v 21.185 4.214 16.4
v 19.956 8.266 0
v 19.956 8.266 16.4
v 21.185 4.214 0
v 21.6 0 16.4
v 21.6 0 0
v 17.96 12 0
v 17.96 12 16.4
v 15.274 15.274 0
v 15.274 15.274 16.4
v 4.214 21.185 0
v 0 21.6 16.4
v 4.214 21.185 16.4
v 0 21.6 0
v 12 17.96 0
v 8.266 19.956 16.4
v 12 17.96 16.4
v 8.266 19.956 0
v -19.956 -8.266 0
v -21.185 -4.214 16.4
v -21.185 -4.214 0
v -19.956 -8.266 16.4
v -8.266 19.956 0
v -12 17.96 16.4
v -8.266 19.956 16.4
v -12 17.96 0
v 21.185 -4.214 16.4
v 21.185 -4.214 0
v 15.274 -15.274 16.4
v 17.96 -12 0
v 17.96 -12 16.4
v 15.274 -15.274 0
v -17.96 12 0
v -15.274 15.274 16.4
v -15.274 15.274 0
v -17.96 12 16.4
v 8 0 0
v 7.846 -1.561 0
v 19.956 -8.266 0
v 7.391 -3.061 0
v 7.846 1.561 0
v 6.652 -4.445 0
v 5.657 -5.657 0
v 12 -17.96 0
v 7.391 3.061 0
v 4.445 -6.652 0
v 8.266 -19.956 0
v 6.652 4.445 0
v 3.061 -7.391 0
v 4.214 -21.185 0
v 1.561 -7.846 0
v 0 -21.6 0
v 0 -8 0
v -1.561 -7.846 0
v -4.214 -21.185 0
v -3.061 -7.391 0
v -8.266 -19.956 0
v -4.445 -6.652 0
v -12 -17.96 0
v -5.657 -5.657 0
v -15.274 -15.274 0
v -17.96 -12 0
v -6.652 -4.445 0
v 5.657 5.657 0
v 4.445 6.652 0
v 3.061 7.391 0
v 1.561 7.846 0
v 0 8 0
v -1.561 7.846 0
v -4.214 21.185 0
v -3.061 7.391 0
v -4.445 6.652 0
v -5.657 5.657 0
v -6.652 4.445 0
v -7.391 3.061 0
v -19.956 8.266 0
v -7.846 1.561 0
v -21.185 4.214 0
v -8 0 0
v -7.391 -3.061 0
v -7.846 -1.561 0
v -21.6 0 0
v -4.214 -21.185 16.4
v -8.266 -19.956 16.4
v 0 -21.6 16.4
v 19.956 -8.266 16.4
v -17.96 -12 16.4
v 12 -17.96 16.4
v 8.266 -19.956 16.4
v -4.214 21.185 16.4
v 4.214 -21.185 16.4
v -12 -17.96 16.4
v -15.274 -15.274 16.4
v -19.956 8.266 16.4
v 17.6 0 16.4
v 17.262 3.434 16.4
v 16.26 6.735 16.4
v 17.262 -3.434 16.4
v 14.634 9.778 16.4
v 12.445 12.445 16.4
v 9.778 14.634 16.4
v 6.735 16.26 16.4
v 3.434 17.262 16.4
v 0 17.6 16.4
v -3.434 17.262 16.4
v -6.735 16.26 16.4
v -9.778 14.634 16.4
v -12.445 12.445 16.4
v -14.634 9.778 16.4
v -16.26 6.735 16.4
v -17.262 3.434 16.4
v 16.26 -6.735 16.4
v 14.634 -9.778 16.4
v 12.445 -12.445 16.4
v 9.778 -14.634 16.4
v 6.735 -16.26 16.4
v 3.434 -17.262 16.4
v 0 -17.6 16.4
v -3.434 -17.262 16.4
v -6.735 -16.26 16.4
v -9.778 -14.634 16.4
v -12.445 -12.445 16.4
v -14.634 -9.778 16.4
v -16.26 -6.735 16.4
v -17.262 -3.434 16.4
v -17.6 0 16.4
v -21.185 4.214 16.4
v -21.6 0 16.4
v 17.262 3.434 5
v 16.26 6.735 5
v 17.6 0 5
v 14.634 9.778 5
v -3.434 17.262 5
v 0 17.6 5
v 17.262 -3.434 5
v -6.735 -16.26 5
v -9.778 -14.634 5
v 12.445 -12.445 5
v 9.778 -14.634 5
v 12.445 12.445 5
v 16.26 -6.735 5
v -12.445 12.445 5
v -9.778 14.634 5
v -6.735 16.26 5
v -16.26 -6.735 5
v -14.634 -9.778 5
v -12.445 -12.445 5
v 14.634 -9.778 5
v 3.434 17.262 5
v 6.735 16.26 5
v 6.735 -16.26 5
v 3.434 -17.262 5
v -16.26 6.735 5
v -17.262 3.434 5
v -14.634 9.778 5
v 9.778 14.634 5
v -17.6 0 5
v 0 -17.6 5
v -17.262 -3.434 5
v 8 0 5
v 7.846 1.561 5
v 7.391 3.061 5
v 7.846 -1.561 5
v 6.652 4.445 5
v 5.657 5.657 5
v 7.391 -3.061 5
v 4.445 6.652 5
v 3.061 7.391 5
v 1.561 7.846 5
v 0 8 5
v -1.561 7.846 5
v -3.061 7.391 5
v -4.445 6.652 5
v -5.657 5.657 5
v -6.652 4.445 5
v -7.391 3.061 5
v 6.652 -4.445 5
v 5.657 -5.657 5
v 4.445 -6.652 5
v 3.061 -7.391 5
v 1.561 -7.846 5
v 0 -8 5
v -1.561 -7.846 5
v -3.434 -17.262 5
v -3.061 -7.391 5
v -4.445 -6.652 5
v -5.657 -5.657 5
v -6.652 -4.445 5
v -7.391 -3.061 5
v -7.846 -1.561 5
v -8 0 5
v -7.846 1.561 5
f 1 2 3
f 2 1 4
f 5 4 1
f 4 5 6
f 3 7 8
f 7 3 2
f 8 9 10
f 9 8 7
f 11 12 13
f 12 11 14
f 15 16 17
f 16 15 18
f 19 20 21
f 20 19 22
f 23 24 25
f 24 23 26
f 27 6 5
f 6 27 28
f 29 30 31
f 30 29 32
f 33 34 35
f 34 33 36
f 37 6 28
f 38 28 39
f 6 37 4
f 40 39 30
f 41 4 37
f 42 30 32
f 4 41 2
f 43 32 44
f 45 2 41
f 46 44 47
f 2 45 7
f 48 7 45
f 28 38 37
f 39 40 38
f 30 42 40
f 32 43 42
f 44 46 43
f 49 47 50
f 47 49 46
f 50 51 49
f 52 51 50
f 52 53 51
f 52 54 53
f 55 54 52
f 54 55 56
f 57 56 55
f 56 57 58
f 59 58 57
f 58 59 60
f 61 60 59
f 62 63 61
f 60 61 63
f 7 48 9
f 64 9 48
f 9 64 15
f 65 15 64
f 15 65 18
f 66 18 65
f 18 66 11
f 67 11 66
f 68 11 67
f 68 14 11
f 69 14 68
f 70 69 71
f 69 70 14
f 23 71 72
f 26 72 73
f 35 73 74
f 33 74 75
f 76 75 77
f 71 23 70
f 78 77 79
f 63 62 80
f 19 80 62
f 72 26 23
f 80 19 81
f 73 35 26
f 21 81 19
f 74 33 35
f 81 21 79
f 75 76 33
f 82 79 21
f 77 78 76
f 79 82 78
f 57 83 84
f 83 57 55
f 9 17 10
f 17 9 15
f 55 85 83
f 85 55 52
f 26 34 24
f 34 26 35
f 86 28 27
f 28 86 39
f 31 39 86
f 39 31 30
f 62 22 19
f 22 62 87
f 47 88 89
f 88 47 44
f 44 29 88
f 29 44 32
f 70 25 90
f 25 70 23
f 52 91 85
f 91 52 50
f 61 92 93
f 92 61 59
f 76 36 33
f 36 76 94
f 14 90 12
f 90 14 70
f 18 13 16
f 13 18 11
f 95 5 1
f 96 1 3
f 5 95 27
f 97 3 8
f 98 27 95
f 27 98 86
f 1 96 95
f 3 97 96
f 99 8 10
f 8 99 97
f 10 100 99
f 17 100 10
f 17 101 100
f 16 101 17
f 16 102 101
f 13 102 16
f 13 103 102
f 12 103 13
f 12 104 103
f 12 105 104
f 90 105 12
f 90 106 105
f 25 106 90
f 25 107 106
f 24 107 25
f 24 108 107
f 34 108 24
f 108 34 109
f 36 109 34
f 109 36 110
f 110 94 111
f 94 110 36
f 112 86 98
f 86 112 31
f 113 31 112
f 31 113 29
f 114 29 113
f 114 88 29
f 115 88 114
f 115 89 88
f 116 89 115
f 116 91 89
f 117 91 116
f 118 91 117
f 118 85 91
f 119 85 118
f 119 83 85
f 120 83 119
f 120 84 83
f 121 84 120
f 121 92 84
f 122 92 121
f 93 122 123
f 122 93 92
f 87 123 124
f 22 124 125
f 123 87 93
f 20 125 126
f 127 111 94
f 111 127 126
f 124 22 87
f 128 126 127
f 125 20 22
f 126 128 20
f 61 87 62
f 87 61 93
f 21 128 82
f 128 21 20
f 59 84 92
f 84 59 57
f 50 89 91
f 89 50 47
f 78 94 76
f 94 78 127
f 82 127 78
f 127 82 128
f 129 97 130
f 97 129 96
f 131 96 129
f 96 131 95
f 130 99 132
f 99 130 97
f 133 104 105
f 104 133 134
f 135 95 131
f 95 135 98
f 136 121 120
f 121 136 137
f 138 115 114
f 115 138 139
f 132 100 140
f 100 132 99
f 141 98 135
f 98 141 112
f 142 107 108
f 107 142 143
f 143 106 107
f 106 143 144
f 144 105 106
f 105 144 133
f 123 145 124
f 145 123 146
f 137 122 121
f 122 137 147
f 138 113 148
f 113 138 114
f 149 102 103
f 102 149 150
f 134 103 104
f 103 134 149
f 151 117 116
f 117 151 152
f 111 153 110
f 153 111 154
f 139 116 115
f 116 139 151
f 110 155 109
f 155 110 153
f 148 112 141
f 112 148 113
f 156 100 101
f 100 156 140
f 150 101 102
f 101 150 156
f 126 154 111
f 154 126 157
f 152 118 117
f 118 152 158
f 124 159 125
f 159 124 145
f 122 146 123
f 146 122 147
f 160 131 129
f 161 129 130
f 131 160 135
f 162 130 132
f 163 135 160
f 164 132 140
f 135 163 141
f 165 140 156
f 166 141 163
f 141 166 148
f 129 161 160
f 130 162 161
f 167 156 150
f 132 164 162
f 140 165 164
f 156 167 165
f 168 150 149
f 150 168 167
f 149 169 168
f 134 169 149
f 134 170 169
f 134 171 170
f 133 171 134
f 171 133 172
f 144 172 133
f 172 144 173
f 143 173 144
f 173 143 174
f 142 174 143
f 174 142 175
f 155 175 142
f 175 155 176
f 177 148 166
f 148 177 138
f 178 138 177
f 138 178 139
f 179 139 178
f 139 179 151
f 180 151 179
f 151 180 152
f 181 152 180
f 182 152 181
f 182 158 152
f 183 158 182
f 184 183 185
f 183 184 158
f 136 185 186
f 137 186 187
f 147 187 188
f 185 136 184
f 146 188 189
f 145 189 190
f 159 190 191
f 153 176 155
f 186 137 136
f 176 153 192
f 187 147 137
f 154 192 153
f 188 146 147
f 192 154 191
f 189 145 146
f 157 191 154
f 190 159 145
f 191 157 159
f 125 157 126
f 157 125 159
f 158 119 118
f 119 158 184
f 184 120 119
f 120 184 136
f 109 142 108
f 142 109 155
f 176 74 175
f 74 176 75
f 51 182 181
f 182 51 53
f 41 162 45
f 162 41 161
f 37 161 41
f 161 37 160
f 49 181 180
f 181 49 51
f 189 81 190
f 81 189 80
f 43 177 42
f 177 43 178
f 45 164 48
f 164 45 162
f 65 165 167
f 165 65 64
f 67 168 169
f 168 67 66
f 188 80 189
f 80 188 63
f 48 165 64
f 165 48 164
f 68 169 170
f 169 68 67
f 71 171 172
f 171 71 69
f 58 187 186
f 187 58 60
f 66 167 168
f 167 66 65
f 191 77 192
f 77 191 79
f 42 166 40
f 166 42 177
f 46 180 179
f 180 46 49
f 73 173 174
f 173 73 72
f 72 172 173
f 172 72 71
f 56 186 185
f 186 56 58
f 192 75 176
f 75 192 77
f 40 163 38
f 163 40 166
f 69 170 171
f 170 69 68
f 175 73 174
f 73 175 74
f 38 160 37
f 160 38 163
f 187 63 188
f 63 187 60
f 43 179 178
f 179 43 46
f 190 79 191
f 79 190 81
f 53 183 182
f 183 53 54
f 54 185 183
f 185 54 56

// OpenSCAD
$fn = 32;

// ----------------------------------------------------------------------
// Bearing housing: seat for 6202 (35 x 11 mm), 43.2 mm body
// ----------------------------------------------------------------------

// --- parameters (mm) ---
housing_d = 43.2;         // housing outside diameter
housing_h = 16.4;         // overall housing height
wall_t = 4;               // wall thickness
seat_d = 35.2;            // 6202 seat, 0.2 mm clearance
seat_h = 11.4;            // pocket depth
shoulder = 5;             // shoulder under the bearing
pass_d = 16;              // shaft passage

module body() {
  cylinder(h = housing_h, d = housing_d);
}

difference() {
  union() {
    body();
  }
  translate([0, 0, housing_h - seat_h]) cylinder(h = seat_h + 1, d = seat_d);
  translate([0, 0, -1]) cylinder(h = housing_h - seat_h + 1, d = pass_d);
}
